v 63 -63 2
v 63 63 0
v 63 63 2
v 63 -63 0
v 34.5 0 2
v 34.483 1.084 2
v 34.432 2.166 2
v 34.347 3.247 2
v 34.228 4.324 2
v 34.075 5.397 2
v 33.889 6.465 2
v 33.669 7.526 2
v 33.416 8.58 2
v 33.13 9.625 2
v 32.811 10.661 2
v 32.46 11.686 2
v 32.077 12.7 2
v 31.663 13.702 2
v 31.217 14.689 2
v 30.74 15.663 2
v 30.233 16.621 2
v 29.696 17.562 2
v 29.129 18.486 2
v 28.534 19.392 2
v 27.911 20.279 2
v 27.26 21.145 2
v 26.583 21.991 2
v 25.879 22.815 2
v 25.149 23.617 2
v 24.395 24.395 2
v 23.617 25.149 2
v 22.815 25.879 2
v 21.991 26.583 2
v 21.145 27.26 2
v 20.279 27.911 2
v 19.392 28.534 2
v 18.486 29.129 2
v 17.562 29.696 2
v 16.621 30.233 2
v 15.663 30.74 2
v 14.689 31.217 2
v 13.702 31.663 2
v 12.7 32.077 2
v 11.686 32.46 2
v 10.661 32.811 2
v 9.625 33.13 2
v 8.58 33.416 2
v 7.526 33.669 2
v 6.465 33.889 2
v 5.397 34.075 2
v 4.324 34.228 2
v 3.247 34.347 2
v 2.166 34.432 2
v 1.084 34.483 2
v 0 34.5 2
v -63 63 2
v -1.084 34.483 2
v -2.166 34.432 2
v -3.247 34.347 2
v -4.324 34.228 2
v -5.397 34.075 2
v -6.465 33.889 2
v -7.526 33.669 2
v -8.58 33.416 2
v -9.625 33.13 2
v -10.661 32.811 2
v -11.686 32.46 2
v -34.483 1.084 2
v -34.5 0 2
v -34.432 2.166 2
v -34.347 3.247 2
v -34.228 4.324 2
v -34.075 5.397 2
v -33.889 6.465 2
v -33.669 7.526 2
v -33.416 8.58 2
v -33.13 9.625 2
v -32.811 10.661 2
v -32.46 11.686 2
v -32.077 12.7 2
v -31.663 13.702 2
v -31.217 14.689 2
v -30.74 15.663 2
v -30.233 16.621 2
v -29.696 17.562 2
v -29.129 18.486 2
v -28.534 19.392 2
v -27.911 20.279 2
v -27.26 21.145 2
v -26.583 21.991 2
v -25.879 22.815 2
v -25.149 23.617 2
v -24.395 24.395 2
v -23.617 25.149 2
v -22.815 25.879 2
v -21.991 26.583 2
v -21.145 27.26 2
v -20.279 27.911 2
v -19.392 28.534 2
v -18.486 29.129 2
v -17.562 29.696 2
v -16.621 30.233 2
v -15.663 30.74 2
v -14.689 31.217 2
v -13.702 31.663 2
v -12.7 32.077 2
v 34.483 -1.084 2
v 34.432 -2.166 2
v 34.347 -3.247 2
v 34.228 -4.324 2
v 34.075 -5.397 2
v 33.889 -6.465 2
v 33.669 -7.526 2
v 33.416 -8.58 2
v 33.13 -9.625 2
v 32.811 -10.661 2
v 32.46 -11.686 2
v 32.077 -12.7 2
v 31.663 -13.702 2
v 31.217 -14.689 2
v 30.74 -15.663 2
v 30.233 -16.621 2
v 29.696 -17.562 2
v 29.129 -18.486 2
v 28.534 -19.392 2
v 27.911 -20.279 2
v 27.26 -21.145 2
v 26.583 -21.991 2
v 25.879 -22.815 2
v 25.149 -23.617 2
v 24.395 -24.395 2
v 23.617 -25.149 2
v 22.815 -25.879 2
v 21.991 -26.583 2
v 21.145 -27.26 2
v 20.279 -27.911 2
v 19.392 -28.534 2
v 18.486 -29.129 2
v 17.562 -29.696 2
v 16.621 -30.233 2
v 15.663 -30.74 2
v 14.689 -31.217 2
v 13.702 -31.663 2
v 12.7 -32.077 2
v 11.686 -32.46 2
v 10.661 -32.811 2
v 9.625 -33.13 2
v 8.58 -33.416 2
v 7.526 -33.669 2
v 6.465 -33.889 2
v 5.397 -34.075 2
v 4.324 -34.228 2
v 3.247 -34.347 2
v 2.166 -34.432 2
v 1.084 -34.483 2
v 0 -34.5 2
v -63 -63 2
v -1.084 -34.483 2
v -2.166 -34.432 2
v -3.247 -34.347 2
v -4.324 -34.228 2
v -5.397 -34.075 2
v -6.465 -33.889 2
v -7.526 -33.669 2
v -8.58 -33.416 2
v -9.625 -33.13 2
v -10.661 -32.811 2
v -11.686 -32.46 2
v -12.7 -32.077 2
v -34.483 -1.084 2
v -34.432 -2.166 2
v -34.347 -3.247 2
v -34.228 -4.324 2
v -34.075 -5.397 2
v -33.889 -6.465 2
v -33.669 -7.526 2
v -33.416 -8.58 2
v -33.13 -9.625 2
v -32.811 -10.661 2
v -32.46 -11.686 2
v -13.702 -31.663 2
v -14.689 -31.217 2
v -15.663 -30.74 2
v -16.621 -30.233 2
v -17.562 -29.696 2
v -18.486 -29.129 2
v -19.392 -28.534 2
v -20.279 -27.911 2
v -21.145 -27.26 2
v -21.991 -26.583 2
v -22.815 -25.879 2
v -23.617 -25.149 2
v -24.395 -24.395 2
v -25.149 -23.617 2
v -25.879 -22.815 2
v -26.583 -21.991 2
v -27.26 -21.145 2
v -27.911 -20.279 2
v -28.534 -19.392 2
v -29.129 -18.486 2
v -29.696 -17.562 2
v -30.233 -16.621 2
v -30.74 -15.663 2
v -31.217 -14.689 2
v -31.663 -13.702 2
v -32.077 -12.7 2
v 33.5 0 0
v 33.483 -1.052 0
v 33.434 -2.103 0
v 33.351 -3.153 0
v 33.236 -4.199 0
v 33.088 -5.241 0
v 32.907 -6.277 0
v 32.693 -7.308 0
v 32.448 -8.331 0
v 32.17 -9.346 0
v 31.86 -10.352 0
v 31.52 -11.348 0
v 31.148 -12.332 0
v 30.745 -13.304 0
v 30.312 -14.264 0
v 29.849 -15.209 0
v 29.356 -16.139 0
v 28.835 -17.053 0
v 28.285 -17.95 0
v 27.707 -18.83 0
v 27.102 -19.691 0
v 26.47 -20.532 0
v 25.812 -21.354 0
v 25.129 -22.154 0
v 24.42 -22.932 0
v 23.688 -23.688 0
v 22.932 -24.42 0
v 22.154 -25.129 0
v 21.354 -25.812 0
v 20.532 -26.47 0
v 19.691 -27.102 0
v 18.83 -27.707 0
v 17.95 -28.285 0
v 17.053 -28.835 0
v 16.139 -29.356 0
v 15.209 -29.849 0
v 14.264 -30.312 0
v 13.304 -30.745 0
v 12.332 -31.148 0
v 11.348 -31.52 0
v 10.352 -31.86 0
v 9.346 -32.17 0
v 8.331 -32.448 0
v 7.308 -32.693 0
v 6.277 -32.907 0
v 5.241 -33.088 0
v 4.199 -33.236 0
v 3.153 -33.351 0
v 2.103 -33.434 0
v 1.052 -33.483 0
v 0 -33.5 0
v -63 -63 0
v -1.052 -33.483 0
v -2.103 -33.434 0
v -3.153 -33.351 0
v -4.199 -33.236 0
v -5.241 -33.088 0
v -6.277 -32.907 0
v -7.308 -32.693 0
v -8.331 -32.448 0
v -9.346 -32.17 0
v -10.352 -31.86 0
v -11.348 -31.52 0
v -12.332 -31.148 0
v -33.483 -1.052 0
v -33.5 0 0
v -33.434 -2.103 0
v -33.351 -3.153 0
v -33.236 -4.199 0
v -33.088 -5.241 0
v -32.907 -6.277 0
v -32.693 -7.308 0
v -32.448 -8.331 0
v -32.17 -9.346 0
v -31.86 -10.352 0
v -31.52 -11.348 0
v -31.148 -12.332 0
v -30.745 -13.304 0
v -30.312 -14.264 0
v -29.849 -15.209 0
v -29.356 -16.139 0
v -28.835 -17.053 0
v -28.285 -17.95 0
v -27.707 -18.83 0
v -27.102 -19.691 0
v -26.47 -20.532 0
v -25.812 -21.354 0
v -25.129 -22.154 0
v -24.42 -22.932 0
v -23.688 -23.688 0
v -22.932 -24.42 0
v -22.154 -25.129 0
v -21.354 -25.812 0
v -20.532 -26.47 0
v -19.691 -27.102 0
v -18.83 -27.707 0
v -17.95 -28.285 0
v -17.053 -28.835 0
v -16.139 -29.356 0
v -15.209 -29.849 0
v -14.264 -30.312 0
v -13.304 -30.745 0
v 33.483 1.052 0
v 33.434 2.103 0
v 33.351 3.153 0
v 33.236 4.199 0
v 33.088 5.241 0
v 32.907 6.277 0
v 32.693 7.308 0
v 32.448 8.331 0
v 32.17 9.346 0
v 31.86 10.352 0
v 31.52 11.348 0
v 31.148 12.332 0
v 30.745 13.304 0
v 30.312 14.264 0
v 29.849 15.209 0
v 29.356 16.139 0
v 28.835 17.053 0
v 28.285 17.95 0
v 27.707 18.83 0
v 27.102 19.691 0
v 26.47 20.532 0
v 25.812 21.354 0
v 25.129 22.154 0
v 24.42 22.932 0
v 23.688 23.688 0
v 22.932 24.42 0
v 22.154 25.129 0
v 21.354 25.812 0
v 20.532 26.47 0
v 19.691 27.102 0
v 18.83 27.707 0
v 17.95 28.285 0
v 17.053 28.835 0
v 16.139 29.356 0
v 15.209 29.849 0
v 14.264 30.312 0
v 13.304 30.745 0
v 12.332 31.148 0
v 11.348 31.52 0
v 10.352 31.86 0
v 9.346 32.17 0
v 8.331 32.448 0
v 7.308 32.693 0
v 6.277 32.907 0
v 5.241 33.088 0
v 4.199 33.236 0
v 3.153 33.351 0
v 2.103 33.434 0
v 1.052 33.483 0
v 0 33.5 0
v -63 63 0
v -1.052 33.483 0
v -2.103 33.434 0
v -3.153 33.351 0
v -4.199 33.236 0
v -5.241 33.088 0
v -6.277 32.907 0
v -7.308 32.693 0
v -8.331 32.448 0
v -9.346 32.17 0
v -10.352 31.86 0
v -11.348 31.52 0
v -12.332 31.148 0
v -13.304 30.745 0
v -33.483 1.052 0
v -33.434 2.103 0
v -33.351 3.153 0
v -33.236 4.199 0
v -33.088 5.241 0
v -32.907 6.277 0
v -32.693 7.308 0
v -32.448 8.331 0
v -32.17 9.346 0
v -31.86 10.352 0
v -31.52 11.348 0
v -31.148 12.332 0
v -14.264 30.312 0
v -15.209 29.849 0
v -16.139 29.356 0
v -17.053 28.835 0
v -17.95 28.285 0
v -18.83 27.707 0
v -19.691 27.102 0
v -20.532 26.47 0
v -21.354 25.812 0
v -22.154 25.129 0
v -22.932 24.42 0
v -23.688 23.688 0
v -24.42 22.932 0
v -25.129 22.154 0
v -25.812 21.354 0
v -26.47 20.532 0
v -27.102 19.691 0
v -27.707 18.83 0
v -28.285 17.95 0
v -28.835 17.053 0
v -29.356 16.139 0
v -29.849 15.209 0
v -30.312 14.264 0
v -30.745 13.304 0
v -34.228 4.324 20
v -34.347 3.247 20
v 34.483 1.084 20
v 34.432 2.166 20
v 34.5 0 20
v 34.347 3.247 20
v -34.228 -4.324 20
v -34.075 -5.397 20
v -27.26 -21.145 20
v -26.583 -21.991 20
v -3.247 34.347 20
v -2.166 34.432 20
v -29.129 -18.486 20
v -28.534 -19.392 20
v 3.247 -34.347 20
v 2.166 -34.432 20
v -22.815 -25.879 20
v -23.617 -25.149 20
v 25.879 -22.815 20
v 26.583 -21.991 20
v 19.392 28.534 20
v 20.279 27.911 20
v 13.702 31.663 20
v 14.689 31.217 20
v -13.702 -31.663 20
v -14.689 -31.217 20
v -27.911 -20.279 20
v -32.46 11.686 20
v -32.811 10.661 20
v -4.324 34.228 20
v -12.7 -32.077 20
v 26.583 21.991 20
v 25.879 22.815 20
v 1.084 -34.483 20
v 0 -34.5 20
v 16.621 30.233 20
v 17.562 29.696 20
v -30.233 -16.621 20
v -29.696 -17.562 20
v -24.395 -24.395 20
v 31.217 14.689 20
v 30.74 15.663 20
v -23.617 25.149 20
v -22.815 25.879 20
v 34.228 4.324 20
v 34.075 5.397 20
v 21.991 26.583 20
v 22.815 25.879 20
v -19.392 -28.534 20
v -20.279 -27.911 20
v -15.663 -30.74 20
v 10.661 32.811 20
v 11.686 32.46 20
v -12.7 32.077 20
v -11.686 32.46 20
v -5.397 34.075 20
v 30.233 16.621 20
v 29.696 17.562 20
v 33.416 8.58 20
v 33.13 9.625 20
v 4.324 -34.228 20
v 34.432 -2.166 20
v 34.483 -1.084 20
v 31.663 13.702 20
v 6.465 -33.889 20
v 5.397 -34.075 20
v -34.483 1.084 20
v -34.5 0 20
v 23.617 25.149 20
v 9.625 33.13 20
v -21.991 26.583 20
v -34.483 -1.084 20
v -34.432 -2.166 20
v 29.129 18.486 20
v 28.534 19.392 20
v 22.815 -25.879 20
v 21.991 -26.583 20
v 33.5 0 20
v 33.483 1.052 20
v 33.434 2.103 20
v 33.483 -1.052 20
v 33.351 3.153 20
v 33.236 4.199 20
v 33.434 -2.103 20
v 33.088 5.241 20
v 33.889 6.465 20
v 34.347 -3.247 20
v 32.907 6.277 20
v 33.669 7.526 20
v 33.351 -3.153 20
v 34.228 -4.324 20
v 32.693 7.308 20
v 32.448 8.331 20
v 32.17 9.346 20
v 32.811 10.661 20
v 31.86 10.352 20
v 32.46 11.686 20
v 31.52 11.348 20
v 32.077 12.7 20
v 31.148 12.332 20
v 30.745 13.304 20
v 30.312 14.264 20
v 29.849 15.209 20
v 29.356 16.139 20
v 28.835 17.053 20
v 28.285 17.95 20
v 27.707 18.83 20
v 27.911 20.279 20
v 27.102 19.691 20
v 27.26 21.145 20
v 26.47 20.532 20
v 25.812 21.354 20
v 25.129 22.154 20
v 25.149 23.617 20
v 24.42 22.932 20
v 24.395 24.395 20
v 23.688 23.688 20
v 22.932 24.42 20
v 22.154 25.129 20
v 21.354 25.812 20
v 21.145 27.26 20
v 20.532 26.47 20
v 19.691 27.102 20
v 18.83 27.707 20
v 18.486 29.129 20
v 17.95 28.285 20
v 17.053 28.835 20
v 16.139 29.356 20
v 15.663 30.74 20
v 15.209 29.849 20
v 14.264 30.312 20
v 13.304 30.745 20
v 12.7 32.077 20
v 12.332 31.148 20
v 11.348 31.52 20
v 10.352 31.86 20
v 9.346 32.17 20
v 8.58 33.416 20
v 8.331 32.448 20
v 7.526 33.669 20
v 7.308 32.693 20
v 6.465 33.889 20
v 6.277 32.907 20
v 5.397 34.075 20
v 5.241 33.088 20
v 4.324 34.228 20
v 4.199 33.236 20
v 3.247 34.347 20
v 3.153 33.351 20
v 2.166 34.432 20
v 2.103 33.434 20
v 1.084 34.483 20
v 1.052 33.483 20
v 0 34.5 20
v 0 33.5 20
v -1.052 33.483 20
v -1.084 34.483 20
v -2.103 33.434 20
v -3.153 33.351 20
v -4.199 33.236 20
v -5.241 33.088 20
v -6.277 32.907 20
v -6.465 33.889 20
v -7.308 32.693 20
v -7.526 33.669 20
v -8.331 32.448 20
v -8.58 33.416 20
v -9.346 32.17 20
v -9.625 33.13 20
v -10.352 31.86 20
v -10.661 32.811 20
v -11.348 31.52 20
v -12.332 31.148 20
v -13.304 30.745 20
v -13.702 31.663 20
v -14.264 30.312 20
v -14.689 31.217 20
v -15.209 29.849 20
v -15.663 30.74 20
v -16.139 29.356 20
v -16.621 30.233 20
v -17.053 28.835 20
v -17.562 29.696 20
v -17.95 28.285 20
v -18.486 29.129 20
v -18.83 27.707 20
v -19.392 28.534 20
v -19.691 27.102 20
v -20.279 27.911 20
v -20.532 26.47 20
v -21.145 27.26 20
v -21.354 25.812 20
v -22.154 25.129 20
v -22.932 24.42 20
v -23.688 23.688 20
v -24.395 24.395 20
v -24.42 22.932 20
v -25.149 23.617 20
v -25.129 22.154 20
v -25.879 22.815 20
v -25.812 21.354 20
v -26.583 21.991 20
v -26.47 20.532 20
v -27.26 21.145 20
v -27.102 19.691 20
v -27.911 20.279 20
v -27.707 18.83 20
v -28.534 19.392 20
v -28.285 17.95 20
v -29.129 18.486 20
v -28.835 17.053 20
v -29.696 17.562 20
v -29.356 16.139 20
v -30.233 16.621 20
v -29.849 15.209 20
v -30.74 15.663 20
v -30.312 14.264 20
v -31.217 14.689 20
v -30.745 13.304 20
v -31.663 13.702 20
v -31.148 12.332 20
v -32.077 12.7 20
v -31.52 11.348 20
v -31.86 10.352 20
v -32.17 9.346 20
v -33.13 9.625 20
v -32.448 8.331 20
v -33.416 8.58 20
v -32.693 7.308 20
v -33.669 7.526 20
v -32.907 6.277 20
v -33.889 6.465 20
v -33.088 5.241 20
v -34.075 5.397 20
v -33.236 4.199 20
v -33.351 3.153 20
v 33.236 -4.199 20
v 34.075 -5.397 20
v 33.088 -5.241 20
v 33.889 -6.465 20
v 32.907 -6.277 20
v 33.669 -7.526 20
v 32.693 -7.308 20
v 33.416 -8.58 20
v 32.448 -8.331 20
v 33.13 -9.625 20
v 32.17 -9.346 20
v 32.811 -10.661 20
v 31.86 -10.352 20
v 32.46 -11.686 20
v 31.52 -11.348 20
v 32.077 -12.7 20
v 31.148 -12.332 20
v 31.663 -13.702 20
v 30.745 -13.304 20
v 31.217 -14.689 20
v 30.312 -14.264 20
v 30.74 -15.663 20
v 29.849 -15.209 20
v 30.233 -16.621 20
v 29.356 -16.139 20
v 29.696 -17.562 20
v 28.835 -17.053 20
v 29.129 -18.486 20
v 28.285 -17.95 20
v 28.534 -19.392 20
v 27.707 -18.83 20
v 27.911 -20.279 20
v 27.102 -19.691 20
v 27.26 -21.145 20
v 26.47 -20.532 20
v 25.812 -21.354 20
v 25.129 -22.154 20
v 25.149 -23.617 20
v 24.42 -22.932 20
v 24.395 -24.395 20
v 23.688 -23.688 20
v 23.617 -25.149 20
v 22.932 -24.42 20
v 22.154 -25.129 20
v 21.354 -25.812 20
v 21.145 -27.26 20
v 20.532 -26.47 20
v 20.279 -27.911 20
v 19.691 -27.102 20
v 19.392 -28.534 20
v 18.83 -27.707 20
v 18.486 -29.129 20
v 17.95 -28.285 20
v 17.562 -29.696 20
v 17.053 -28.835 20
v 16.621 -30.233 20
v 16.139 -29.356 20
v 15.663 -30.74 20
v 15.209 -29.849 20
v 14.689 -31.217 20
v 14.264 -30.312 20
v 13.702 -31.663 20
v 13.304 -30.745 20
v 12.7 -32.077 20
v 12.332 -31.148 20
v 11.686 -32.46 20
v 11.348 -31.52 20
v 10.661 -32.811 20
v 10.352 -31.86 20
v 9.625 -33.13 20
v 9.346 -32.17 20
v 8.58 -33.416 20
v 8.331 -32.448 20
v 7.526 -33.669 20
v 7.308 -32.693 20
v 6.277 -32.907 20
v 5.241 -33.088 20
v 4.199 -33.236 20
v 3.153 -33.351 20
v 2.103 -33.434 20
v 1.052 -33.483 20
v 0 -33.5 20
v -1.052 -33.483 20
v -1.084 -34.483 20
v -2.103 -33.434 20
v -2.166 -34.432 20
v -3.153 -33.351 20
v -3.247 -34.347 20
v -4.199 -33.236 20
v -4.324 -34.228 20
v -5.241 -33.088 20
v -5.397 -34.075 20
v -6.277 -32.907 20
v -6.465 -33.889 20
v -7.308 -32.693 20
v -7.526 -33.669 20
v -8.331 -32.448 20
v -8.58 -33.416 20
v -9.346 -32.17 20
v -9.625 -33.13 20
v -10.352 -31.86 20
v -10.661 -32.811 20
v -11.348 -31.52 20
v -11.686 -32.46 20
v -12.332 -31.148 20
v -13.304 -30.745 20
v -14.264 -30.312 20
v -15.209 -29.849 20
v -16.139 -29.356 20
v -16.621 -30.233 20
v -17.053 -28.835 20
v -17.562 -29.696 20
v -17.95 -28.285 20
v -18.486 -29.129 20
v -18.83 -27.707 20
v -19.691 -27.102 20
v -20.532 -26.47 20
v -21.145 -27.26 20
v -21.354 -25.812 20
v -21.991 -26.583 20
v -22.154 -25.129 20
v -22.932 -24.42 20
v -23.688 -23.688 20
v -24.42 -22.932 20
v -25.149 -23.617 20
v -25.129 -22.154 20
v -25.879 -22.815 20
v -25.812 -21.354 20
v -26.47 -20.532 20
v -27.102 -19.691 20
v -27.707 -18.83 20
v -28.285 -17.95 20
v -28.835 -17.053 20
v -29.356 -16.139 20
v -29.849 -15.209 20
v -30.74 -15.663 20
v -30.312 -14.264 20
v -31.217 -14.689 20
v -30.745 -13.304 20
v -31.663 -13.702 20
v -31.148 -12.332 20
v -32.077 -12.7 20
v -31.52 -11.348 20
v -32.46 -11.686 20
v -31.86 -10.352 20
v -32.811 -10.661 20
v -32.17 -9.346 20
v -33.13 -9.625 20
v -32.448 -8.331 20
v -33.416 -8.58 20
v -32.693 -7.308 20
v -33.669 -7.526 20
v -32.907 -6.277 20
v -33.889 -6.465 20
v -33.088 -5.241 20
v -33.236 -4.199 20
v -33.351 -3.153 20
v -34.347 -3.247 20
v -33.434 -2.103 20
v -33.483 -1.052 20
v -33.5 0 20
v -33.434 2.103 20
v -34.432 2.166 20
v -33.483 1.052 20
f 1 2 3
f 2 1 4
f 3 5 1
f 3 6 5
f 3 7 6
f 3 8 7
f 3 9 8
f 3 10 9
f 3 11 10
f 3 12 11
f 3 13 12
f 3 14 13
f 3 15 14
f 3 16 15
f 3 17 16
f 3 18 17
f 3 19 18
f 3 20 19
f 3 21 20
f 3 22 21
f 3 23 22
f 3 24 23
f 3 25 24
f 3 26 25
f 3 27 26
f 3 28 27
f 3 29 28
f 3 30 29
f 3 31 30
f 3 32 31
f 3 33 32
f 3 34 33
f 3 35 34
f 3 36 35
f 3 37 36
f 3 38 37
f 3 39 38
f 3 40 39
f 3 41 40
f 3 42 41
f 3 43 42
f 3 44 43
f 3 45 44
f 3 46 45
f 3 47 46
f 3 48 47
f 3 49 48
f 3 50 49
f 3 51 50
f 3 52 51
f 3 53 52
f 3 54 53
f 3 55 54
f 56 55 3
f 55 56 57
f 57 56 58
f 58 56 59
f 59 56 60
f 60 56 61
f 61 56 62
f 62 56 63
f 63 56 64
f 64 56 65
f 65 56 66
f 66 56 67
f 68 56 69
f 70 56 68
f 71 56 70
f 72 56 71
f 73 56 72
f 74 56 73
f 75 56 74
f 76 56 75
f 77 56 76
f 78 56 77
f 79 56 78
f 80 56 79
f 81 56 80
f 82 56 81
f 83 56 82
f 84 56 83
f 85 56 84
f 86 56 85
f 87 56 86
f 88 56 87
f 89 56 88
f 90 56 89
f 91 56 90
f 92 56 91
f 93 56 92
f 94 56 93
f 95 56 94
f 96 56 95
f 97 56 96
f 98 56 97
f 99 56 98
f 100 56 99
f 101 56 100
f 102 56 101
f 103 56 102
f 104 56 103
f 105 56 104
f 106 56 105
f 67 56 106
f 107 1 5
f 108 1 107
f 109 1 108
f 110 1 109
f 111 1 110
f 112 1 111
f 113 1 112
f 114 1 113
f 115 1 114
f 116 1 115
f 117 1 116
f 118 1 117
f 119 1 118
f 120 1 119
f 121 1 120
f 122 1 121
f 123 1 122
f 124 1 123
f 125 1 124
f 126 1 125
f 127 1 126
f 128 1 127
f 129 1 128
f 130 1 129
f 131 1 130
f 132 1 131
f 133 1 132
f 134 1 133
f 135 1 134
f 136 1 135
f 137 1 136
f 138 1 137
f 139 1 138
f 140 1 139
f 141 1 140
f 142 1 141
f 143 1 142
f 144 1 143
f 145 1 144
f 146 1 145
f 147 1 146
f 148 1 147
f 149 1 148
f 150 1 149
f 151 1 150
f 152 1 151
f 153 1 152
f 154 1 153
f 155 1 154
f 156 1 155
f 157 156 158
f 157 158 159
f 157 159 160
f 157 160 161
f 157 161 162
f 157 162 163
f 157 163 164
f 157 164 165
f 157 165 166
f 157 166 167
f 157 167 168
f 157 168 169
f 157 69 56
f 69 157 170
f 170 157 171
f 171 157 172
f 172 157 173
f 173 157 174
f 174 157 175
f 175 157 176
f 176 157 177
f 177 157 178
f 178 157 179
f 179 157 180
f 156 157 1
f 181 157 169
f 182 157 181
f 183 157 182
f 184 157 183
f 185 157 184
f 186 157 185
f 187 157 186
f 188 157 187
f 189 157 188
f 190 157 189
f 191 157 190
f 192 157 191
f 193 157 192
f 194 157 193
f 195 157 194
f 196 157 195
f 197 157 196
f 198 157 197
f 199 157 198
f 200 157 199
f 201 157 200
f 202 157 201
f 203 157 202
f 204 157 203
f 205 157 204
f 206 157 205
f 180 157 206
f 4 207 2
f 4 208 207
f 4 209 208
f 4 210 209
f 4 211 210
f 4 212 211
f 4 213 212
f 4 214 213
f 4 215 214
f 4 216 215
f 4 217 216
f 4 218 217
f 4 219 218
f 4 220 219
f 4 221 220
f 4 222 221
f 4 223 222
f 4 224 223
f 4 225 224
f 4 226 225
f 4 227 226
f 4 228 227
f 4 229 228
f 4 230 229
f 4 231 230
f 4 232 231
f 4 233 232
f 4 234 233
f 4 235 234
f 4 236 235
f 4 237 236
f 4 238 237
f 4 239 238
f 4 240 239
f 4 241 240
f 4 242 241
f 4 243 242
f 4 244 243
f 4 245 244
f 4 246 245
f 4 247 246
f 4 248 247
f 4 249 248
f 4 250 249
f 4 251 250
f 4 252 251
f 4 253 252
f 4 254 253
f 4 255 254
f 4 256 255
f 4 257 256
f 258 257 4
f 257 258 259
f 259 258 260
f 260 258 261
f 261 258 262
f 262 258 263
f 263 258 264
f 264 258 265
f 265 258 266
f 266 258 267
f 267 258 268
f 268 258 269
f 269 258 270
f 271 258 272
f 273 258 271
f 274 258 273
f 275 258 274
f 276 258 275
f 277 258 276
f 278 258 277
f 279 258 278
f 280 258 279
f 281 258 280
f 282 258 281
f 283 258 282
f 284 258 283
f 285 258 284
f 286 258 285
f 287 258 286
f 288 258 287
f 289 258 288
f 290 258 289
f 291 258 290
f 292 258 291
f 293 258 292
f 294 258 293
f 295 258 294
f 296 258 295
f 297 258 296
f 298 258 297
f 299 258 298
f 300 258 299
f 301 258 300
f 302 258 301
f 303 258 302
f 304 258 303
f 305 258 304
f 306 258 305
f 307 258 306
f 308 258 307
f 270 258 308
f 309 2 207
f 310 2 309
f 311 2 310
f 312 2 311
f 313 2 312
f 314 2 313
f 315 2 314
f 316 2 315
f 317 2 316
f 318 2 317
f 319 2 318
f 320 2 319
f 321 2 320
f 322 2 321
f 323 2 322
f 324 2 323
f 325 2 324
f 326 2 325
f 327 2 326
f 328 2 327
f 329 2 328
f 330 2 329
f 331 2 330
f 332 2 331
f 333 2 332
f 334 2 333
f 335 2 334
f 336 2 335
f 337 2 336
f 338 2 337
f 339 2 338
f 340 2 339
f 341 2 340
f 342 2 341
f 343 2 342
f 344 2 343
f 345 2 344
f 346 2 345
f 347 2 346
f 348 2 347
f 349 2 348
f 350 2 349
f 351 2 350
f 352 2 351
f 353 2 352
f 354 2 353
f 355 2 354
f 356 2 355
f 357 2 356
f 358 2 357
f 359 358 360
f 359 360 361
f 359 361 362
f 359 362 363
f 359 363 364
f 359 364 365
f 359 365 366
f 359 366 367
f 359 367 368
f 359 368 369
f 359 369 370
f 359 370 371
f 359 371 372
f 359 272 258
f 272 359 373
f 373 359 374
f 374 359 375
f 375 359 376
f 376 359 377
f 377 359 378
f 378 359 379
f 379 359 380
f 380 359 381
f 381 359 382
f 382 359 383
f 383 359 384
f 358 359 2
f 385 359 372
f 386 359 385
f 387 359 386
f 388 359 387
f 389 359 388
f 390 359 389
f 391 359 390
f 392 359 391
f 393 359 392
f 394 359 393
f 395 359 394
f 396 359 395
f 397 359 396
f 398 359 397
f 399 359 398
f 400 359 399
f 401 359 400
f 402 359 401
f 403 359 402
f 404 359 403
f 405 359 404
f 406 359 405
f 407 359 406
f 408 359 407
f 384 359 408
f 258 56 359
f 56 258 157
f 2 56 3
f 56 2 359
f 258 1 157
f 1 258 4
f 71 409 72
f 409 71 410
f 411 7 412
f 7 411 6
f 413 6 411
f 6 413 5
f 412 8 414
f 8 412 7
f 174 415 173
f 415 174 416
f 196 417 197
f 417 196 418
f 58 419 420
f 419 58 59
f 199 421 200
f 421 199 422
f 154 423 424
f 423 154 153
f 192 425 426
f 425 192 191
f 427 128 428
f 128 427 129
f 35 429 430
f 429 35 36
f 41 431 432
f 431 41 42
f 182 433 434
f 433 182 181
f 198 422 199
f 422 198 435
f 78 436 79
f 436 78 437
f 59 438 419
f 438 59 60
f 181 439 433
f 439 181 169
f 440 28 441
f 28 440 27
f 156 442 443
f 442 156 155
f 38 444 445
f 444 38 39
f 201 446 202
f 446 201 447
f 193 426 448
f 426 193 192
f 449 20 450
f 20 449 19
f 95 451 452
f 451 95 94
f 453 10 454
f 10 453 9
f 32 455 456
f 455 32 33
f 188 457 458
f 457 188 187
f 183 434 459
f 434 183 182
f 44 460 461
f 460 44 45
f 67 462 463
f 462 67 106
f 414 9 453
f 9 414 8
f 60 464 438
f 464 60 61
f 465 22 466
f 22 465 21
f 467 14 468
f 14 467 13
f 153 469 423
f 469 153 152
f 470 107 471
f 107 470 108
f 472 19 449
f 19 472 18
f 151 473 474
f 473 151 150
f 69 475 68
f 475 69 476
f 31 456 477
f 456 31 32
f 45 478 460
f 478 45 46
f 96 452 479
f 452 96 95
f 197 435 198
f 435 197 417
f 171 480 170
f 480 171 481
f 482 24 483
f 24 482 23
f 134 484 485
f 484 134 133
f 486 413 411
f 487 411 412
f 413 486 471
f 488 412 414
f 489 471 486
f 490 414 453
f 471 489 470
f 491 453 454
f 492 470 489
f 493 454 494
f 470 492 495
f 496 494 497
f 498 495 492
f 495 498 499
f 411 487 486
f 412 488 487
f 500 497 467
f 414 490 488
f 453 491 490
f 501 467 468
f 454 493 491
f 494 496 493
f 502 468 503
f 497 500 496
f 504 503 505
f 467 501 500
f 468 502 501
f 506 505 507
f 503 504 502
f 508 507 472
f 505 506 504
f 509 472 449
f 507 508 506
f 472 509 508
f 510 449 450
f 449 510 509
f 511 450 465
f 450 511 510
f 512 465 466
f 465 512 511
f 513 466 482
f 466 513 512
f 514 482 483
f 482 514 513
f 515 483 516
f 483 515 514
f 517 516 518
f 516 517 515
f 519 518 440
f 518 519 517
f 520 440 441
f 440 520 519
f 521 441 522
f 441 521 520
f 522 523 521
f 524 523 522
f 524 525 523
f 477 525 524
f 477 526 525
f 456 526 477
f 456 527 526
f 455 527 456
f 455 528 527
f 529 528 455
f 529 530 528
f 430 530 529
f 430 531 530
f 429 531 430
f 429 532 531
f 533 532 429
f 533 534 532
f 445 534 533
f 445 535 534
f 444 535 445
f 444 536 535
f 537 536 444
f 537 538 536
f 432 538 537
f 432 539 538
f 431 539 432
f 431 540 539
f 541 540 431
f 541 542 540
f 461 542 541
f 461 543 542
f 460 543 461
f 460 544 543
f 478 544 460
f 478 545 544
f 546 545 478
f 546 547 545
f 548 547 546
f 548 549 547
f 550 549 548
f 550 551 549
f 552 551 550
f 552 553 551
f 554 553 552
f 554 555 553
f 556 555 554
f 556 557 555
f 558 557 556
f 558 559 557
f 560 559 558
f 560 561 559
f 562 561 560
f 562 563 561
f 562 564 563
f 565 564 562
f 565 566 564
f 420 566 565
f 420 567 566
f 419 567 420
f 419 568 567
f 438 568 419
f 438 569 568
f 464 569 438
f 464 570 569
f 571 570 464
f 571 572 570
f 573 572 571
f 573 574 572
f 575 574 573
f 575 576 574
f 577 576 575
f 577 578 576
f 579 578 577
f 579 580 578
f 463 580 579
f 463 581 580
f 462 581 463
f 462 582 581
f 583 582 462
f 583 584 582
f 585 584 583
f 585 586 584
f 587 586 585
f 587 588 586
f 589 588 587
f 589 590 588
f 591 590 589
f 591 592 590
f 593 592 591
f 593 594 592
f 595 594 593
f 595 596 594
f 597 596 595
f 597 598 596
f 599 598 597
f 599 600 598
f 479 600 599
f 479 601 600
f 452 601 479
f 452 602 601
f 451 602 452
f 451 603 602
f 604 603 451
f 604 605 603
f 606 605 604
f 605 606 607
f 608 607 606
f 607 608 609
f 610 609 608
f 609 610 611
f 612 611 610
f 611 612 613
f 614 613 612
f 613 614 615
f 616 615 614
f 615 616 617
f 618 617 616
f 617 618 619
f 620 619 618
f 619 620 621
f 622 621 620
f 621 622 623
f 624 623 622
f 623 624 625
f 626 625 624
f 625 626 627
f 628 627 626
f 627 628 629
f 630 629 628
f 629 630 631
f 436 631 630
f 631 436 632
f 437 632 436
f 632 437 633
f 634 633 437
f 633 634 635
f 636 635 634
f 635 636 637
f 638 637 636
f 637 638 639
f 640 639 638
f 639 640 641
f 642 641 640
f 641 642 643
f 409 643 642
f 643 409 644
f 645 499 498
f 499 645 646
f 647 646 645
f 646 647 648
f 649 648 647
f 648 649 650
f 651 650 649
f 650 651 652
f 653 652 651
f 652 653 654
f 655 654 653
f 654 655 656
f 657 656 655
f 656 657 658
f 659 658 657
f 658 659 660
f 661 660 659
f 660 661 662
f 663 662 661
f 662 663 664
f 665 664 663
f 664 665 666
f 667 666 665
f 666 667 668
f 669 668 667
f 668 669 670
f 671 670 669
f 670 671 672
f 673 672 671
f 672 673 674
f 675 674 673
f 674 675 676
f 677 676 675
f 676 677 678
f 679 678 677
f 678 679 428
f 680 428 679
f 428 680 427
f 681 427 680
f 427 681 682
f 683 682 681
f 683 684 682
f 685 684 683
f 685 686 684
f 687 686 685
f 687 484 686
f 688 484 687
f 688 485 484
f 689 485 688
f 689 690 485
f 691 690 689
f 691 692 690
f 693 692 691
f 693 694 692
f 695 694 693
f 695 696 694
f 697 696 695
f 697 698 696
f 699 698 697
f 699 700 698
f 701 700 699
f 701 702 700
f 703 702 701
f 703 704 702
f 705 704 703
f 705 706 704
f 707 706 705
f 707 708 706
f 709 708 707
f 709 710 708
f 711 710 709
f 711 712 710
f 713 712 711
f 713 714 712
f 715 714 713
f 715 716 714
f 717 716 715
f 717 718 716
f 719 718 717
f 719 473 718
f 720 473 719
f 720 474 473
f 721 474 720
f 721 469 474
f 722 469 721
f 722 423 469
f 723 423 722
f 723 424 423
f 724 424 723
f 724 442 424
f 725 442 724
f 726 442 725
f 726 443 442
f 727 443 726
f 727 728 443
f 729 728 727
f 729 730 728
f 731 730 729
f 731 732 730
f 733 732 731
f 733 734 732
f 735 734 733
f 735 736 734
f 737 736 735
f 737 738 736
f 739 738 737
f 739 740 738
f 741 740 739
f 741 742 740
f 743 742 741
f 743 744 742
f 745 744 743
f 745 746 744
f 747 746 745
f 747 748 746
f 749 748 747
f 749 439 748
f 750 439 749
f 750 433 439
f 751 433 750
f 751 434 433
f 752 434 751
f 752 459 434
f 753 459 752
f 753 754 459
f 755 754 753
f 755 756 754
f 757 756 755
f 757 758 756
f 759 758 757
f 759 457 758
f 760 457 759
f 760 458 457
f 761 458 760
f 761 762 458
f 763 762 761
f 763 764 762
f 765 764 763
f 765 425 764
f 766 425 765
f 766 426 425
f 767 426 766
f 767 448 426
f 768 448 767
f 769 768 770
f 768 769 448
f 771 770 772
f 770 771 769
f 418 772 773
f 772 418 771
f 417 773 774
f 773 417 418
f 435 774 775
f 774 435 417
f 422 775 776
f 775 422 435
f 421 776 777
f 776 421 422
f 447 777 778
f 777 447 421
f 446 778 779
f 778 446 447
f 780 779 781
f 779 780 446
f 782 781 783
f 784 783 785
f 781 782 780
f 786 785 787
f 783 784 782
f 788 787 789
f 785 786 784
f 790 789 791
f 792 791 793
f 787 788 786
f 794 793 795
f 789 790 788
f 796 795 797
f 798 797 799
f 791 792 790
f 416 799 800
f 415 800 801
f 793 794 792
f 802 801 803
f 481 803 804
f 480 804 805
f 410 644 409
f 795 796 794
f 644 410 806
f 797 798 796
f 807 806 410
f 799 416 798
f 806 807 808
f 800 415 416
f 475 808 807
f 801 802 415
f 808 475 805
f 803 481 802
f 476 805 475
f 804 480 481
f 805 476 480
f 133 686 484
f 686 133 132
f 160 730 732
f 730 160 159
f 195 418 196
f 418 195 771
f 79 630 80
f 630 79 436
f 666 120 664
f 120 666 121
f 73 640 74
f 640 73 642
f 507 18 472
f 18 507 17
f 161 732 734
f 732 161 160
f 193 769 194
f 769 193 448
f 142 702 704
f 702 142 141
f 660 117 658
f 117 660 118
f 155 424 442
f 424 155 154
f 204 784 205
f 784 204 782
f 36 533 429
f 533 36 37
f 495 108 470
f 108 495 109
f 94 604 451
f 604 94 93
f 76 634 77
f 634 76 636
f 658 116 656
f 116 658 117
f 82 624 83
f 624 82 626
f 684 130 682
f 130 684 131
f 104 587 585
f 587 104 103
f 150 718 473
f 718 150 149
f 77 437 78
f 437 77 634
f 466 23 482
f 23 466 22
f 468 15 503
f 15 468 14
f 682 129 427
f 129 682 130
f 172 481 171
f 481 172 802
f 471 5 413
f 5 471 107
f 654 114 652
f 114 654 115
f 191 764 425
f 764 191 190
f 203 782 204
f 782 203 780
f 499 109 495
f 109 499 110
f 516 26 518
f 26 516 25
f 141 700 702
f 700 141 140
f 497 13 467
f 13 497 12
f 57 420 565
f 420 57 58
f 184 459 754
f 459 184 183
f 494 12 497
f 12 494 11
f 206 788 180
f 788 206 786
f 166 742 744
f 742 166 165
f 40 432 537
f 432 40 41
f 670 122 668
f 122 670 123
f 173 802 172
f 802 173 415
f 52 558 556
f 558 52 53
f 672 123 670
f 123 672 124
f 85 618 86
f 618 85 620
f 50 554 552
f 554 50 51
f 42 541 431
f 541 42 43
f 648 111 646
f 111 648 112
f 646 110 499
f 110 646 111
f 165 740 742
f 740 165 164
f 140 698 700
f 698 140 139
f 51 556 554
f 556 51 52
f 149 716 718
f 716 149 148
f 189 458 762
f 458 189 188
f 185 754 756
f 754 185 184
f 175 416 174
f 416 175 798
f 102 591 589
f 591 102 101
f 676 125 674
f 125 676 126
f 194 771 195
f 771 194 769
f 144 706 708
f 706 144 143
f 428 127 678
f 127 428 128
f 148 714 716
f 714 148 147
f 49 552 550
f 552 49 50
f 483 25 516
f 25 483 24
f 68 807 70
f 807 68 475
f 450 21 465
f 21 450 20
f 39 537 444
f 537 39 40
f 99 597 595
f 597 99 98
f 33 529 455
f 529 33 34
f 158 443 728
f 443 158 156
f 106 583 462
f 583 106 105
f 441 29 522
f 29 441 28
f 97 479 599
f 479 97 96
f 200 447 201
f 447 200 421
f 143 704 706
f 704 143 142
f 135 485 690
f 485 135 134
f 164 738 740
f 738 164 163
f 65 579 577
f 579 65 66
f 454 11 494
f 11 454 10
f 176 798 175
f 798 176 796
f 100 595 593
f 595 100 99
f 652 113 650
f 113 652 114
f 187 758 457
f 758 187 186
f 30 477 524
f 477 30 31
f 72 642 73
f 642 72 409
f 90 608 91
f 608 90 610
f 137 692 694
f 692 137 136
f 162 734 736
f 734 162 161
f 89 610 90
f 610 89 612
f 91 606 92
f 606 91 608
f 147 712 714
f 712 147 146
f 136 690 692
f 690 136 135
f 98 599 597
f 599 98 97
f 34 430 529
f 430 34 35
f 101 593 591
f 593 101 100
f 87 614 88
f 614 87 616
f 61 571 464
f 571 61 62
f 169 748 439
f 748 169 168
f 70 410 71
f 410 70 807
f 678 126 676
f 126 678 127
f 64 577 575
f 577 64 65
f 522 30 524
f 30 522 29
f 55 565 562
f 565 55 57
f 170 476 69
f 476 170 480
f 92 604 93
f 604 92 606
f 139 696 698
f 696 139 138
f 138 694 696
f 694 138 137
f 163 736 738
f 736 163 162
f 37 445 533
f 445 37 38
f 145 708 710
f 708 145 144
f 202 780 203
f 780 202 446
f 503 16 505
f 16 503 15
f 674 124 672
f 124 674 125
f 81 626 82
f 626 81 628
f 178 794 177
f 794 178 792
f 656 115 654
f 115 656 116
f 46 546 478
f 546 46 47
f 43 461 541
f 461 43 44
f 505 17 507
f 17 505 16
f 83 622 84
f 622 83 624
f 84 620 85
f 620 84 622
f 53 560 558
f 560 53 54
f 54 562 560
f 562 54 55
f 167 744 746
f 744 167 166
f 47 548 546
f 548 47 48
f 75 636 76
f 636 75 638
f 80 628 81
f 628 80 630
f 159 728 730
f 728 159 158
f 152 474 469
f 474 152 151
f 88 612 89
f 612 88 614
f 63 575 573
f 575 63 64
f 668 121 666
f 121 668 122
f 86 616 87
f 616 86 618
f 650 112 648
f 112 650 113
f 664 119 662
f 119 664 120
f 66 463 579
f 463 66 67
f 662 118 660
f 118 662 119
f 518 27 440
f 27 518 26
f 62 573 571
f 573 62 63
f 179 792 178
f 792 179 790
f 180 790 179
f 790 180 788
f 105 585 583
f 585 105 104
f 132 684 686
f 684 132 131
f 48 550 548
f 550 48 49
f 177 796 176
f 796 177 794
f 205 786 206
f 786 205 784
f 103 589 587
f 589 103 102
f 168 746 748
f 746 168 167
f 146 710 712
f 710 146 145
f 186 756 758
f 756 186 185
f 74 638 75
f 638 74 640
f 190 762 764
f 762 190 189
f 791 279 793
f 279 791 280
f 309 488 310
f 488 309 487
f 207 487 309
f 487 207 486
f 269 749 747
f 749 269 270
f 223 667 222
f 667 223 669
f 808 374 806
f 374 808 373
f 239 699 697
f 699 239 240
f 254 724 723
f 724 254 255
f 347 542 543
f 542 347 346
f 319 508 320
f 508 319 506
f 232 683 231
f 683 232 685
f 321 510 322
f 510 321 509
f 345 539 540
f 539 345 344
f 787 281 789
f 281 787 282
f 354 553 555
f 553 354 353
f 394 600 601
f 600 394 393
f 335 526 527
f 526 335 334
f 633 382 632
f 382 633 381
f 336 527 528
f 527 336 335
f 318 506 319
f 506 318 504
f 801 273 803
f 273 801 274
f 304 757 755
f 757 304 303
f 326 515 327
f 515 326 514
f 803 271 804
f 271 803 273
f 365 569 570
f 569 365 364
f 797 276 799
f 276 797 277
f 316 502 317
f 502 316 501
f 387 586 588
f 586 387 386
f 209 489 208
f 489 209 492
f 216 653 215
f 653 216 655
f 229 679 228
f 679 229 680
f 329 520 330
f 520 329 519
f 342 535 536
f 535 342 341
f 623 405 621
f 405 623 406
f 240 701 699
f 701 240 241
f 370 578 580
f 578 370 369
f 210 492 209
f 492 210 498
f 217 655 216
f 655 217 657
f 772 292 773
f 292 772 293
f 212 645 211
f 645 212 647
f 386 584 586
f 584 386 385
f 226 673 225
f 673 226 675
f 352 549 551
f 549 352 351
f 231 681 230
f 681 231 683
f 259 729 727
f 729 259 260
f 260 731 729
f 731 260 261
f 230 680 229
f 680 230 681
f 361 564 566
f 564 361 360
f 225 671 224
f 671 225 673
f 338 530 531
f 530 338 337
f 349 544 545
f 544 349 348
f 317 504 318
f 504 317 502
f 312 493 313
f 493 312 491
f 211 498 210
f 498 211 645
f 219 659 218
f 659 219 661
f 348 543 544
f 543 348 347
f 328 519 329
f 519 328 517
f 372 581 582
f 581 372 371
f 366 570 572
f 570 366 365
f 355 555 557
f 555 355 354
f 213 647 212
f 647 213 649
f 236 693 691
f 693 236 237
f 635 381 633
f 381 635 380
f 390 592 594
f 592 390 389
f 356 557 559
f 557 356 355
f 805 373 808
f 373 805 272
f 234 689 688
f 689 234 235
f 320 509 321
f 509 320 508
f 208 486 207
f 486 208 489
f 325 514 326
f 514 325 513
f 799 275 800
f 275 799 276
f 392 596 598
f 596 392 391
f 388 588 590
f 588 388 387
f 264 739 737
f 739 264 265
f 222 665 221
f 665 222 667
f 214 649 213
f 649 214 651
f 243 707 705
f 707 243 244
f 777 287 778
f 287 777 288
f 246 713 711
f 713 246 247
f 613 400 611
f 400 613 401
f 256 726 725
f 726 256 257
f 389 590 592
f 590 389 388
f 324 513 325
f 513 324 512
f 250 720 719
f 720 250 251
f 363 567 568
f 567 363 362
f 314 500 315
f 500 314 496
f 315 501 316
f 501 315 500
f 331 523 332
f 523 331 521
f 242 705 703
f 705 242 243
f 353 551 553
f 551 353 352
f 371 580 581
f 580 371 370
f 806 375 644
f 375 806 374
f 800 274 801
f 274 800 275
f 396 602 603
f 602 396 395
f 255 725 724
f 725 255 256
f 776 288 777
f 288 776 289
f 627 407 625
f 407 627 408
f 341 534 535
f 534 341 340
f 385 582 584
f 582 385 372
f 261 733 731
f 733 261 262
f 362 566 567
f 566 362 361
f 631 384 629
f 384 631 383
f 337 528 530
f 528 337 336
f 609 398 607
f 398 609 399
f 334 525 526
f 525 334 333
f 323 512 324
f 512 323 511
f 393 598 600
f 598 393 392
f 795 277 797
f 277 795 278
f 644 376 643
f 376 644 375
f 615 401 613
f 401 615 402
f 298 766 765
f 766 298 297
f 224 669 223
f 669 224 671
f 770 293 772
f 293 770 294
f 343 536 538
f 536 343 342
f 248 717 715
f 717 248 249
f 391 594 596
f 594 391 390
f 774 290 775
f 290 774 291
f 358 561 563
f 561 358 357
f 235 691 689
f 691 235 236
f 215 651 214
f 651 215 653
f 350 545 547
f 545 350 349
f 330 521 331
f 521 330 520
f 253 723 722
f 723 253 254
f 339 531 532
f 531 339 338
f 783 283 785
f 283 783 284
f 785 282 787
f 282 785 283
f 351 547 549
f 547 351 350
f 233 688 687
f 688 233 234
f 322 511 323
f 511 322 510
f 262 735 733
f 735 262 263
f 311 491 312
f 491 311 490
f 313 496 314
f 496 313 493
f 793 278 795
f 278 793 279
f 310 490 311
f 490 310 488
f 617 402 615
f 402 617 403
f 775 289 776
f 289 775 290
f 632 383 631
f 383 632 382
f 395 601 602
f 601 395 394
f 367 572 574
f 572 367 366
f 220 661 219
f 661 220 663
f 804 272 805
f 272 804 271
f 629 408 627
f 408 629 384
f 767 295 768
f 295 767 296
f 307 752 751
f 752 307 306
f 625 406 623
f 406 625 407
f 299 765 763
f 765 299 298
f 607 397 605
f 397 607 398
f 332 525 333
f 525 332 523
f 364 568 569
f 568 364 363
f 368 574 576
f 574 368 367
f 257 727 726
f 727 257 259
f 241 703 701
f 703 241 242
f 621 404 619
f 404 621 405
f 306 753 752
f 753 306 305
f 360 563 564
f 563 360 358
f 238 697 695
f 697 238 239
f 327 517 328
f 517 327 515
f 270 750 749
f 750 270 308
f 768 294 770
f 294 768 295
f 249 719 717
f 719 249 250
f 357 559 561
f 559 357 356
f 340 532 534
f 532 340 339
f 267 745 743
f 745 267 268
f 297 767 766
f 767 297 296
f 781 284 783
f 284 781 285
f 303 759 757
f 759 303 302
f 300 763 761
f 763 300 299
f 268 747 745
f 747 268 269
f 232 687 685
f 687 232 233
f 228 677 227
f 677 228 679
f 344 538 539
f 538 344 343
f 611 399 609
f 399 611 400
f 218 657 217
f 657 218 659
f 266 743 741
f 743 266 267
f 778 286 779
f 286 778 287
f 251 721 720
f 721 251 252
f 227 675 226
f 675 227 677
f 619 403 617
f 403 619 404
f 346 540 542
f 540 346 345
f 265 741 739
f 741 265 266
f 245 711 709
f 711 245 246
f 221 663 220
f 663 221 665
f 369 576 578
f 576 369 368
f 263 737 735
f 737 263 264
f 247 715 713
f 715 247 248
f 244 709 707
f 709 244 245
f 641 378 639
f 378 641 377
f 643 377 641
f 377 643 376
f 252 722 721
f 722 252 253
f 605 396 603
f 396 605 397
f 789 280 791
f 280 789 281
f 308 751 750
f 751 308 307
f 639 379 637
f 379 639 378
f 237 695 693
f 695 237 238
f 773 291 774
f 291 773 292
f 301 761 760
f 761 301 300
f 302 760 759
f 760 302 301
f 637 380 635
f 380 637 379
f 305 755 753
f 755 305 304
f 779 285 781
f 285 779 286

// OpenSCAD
$fn=200;
width=126;
difference() {
  union() {
    translate([-width/2, -width/2,0]) cube([width,width,2]);
    cylinder(h=20, d=69);
  };
  translate([0,0, -10]) cylinder(h=40,d=67);
};
